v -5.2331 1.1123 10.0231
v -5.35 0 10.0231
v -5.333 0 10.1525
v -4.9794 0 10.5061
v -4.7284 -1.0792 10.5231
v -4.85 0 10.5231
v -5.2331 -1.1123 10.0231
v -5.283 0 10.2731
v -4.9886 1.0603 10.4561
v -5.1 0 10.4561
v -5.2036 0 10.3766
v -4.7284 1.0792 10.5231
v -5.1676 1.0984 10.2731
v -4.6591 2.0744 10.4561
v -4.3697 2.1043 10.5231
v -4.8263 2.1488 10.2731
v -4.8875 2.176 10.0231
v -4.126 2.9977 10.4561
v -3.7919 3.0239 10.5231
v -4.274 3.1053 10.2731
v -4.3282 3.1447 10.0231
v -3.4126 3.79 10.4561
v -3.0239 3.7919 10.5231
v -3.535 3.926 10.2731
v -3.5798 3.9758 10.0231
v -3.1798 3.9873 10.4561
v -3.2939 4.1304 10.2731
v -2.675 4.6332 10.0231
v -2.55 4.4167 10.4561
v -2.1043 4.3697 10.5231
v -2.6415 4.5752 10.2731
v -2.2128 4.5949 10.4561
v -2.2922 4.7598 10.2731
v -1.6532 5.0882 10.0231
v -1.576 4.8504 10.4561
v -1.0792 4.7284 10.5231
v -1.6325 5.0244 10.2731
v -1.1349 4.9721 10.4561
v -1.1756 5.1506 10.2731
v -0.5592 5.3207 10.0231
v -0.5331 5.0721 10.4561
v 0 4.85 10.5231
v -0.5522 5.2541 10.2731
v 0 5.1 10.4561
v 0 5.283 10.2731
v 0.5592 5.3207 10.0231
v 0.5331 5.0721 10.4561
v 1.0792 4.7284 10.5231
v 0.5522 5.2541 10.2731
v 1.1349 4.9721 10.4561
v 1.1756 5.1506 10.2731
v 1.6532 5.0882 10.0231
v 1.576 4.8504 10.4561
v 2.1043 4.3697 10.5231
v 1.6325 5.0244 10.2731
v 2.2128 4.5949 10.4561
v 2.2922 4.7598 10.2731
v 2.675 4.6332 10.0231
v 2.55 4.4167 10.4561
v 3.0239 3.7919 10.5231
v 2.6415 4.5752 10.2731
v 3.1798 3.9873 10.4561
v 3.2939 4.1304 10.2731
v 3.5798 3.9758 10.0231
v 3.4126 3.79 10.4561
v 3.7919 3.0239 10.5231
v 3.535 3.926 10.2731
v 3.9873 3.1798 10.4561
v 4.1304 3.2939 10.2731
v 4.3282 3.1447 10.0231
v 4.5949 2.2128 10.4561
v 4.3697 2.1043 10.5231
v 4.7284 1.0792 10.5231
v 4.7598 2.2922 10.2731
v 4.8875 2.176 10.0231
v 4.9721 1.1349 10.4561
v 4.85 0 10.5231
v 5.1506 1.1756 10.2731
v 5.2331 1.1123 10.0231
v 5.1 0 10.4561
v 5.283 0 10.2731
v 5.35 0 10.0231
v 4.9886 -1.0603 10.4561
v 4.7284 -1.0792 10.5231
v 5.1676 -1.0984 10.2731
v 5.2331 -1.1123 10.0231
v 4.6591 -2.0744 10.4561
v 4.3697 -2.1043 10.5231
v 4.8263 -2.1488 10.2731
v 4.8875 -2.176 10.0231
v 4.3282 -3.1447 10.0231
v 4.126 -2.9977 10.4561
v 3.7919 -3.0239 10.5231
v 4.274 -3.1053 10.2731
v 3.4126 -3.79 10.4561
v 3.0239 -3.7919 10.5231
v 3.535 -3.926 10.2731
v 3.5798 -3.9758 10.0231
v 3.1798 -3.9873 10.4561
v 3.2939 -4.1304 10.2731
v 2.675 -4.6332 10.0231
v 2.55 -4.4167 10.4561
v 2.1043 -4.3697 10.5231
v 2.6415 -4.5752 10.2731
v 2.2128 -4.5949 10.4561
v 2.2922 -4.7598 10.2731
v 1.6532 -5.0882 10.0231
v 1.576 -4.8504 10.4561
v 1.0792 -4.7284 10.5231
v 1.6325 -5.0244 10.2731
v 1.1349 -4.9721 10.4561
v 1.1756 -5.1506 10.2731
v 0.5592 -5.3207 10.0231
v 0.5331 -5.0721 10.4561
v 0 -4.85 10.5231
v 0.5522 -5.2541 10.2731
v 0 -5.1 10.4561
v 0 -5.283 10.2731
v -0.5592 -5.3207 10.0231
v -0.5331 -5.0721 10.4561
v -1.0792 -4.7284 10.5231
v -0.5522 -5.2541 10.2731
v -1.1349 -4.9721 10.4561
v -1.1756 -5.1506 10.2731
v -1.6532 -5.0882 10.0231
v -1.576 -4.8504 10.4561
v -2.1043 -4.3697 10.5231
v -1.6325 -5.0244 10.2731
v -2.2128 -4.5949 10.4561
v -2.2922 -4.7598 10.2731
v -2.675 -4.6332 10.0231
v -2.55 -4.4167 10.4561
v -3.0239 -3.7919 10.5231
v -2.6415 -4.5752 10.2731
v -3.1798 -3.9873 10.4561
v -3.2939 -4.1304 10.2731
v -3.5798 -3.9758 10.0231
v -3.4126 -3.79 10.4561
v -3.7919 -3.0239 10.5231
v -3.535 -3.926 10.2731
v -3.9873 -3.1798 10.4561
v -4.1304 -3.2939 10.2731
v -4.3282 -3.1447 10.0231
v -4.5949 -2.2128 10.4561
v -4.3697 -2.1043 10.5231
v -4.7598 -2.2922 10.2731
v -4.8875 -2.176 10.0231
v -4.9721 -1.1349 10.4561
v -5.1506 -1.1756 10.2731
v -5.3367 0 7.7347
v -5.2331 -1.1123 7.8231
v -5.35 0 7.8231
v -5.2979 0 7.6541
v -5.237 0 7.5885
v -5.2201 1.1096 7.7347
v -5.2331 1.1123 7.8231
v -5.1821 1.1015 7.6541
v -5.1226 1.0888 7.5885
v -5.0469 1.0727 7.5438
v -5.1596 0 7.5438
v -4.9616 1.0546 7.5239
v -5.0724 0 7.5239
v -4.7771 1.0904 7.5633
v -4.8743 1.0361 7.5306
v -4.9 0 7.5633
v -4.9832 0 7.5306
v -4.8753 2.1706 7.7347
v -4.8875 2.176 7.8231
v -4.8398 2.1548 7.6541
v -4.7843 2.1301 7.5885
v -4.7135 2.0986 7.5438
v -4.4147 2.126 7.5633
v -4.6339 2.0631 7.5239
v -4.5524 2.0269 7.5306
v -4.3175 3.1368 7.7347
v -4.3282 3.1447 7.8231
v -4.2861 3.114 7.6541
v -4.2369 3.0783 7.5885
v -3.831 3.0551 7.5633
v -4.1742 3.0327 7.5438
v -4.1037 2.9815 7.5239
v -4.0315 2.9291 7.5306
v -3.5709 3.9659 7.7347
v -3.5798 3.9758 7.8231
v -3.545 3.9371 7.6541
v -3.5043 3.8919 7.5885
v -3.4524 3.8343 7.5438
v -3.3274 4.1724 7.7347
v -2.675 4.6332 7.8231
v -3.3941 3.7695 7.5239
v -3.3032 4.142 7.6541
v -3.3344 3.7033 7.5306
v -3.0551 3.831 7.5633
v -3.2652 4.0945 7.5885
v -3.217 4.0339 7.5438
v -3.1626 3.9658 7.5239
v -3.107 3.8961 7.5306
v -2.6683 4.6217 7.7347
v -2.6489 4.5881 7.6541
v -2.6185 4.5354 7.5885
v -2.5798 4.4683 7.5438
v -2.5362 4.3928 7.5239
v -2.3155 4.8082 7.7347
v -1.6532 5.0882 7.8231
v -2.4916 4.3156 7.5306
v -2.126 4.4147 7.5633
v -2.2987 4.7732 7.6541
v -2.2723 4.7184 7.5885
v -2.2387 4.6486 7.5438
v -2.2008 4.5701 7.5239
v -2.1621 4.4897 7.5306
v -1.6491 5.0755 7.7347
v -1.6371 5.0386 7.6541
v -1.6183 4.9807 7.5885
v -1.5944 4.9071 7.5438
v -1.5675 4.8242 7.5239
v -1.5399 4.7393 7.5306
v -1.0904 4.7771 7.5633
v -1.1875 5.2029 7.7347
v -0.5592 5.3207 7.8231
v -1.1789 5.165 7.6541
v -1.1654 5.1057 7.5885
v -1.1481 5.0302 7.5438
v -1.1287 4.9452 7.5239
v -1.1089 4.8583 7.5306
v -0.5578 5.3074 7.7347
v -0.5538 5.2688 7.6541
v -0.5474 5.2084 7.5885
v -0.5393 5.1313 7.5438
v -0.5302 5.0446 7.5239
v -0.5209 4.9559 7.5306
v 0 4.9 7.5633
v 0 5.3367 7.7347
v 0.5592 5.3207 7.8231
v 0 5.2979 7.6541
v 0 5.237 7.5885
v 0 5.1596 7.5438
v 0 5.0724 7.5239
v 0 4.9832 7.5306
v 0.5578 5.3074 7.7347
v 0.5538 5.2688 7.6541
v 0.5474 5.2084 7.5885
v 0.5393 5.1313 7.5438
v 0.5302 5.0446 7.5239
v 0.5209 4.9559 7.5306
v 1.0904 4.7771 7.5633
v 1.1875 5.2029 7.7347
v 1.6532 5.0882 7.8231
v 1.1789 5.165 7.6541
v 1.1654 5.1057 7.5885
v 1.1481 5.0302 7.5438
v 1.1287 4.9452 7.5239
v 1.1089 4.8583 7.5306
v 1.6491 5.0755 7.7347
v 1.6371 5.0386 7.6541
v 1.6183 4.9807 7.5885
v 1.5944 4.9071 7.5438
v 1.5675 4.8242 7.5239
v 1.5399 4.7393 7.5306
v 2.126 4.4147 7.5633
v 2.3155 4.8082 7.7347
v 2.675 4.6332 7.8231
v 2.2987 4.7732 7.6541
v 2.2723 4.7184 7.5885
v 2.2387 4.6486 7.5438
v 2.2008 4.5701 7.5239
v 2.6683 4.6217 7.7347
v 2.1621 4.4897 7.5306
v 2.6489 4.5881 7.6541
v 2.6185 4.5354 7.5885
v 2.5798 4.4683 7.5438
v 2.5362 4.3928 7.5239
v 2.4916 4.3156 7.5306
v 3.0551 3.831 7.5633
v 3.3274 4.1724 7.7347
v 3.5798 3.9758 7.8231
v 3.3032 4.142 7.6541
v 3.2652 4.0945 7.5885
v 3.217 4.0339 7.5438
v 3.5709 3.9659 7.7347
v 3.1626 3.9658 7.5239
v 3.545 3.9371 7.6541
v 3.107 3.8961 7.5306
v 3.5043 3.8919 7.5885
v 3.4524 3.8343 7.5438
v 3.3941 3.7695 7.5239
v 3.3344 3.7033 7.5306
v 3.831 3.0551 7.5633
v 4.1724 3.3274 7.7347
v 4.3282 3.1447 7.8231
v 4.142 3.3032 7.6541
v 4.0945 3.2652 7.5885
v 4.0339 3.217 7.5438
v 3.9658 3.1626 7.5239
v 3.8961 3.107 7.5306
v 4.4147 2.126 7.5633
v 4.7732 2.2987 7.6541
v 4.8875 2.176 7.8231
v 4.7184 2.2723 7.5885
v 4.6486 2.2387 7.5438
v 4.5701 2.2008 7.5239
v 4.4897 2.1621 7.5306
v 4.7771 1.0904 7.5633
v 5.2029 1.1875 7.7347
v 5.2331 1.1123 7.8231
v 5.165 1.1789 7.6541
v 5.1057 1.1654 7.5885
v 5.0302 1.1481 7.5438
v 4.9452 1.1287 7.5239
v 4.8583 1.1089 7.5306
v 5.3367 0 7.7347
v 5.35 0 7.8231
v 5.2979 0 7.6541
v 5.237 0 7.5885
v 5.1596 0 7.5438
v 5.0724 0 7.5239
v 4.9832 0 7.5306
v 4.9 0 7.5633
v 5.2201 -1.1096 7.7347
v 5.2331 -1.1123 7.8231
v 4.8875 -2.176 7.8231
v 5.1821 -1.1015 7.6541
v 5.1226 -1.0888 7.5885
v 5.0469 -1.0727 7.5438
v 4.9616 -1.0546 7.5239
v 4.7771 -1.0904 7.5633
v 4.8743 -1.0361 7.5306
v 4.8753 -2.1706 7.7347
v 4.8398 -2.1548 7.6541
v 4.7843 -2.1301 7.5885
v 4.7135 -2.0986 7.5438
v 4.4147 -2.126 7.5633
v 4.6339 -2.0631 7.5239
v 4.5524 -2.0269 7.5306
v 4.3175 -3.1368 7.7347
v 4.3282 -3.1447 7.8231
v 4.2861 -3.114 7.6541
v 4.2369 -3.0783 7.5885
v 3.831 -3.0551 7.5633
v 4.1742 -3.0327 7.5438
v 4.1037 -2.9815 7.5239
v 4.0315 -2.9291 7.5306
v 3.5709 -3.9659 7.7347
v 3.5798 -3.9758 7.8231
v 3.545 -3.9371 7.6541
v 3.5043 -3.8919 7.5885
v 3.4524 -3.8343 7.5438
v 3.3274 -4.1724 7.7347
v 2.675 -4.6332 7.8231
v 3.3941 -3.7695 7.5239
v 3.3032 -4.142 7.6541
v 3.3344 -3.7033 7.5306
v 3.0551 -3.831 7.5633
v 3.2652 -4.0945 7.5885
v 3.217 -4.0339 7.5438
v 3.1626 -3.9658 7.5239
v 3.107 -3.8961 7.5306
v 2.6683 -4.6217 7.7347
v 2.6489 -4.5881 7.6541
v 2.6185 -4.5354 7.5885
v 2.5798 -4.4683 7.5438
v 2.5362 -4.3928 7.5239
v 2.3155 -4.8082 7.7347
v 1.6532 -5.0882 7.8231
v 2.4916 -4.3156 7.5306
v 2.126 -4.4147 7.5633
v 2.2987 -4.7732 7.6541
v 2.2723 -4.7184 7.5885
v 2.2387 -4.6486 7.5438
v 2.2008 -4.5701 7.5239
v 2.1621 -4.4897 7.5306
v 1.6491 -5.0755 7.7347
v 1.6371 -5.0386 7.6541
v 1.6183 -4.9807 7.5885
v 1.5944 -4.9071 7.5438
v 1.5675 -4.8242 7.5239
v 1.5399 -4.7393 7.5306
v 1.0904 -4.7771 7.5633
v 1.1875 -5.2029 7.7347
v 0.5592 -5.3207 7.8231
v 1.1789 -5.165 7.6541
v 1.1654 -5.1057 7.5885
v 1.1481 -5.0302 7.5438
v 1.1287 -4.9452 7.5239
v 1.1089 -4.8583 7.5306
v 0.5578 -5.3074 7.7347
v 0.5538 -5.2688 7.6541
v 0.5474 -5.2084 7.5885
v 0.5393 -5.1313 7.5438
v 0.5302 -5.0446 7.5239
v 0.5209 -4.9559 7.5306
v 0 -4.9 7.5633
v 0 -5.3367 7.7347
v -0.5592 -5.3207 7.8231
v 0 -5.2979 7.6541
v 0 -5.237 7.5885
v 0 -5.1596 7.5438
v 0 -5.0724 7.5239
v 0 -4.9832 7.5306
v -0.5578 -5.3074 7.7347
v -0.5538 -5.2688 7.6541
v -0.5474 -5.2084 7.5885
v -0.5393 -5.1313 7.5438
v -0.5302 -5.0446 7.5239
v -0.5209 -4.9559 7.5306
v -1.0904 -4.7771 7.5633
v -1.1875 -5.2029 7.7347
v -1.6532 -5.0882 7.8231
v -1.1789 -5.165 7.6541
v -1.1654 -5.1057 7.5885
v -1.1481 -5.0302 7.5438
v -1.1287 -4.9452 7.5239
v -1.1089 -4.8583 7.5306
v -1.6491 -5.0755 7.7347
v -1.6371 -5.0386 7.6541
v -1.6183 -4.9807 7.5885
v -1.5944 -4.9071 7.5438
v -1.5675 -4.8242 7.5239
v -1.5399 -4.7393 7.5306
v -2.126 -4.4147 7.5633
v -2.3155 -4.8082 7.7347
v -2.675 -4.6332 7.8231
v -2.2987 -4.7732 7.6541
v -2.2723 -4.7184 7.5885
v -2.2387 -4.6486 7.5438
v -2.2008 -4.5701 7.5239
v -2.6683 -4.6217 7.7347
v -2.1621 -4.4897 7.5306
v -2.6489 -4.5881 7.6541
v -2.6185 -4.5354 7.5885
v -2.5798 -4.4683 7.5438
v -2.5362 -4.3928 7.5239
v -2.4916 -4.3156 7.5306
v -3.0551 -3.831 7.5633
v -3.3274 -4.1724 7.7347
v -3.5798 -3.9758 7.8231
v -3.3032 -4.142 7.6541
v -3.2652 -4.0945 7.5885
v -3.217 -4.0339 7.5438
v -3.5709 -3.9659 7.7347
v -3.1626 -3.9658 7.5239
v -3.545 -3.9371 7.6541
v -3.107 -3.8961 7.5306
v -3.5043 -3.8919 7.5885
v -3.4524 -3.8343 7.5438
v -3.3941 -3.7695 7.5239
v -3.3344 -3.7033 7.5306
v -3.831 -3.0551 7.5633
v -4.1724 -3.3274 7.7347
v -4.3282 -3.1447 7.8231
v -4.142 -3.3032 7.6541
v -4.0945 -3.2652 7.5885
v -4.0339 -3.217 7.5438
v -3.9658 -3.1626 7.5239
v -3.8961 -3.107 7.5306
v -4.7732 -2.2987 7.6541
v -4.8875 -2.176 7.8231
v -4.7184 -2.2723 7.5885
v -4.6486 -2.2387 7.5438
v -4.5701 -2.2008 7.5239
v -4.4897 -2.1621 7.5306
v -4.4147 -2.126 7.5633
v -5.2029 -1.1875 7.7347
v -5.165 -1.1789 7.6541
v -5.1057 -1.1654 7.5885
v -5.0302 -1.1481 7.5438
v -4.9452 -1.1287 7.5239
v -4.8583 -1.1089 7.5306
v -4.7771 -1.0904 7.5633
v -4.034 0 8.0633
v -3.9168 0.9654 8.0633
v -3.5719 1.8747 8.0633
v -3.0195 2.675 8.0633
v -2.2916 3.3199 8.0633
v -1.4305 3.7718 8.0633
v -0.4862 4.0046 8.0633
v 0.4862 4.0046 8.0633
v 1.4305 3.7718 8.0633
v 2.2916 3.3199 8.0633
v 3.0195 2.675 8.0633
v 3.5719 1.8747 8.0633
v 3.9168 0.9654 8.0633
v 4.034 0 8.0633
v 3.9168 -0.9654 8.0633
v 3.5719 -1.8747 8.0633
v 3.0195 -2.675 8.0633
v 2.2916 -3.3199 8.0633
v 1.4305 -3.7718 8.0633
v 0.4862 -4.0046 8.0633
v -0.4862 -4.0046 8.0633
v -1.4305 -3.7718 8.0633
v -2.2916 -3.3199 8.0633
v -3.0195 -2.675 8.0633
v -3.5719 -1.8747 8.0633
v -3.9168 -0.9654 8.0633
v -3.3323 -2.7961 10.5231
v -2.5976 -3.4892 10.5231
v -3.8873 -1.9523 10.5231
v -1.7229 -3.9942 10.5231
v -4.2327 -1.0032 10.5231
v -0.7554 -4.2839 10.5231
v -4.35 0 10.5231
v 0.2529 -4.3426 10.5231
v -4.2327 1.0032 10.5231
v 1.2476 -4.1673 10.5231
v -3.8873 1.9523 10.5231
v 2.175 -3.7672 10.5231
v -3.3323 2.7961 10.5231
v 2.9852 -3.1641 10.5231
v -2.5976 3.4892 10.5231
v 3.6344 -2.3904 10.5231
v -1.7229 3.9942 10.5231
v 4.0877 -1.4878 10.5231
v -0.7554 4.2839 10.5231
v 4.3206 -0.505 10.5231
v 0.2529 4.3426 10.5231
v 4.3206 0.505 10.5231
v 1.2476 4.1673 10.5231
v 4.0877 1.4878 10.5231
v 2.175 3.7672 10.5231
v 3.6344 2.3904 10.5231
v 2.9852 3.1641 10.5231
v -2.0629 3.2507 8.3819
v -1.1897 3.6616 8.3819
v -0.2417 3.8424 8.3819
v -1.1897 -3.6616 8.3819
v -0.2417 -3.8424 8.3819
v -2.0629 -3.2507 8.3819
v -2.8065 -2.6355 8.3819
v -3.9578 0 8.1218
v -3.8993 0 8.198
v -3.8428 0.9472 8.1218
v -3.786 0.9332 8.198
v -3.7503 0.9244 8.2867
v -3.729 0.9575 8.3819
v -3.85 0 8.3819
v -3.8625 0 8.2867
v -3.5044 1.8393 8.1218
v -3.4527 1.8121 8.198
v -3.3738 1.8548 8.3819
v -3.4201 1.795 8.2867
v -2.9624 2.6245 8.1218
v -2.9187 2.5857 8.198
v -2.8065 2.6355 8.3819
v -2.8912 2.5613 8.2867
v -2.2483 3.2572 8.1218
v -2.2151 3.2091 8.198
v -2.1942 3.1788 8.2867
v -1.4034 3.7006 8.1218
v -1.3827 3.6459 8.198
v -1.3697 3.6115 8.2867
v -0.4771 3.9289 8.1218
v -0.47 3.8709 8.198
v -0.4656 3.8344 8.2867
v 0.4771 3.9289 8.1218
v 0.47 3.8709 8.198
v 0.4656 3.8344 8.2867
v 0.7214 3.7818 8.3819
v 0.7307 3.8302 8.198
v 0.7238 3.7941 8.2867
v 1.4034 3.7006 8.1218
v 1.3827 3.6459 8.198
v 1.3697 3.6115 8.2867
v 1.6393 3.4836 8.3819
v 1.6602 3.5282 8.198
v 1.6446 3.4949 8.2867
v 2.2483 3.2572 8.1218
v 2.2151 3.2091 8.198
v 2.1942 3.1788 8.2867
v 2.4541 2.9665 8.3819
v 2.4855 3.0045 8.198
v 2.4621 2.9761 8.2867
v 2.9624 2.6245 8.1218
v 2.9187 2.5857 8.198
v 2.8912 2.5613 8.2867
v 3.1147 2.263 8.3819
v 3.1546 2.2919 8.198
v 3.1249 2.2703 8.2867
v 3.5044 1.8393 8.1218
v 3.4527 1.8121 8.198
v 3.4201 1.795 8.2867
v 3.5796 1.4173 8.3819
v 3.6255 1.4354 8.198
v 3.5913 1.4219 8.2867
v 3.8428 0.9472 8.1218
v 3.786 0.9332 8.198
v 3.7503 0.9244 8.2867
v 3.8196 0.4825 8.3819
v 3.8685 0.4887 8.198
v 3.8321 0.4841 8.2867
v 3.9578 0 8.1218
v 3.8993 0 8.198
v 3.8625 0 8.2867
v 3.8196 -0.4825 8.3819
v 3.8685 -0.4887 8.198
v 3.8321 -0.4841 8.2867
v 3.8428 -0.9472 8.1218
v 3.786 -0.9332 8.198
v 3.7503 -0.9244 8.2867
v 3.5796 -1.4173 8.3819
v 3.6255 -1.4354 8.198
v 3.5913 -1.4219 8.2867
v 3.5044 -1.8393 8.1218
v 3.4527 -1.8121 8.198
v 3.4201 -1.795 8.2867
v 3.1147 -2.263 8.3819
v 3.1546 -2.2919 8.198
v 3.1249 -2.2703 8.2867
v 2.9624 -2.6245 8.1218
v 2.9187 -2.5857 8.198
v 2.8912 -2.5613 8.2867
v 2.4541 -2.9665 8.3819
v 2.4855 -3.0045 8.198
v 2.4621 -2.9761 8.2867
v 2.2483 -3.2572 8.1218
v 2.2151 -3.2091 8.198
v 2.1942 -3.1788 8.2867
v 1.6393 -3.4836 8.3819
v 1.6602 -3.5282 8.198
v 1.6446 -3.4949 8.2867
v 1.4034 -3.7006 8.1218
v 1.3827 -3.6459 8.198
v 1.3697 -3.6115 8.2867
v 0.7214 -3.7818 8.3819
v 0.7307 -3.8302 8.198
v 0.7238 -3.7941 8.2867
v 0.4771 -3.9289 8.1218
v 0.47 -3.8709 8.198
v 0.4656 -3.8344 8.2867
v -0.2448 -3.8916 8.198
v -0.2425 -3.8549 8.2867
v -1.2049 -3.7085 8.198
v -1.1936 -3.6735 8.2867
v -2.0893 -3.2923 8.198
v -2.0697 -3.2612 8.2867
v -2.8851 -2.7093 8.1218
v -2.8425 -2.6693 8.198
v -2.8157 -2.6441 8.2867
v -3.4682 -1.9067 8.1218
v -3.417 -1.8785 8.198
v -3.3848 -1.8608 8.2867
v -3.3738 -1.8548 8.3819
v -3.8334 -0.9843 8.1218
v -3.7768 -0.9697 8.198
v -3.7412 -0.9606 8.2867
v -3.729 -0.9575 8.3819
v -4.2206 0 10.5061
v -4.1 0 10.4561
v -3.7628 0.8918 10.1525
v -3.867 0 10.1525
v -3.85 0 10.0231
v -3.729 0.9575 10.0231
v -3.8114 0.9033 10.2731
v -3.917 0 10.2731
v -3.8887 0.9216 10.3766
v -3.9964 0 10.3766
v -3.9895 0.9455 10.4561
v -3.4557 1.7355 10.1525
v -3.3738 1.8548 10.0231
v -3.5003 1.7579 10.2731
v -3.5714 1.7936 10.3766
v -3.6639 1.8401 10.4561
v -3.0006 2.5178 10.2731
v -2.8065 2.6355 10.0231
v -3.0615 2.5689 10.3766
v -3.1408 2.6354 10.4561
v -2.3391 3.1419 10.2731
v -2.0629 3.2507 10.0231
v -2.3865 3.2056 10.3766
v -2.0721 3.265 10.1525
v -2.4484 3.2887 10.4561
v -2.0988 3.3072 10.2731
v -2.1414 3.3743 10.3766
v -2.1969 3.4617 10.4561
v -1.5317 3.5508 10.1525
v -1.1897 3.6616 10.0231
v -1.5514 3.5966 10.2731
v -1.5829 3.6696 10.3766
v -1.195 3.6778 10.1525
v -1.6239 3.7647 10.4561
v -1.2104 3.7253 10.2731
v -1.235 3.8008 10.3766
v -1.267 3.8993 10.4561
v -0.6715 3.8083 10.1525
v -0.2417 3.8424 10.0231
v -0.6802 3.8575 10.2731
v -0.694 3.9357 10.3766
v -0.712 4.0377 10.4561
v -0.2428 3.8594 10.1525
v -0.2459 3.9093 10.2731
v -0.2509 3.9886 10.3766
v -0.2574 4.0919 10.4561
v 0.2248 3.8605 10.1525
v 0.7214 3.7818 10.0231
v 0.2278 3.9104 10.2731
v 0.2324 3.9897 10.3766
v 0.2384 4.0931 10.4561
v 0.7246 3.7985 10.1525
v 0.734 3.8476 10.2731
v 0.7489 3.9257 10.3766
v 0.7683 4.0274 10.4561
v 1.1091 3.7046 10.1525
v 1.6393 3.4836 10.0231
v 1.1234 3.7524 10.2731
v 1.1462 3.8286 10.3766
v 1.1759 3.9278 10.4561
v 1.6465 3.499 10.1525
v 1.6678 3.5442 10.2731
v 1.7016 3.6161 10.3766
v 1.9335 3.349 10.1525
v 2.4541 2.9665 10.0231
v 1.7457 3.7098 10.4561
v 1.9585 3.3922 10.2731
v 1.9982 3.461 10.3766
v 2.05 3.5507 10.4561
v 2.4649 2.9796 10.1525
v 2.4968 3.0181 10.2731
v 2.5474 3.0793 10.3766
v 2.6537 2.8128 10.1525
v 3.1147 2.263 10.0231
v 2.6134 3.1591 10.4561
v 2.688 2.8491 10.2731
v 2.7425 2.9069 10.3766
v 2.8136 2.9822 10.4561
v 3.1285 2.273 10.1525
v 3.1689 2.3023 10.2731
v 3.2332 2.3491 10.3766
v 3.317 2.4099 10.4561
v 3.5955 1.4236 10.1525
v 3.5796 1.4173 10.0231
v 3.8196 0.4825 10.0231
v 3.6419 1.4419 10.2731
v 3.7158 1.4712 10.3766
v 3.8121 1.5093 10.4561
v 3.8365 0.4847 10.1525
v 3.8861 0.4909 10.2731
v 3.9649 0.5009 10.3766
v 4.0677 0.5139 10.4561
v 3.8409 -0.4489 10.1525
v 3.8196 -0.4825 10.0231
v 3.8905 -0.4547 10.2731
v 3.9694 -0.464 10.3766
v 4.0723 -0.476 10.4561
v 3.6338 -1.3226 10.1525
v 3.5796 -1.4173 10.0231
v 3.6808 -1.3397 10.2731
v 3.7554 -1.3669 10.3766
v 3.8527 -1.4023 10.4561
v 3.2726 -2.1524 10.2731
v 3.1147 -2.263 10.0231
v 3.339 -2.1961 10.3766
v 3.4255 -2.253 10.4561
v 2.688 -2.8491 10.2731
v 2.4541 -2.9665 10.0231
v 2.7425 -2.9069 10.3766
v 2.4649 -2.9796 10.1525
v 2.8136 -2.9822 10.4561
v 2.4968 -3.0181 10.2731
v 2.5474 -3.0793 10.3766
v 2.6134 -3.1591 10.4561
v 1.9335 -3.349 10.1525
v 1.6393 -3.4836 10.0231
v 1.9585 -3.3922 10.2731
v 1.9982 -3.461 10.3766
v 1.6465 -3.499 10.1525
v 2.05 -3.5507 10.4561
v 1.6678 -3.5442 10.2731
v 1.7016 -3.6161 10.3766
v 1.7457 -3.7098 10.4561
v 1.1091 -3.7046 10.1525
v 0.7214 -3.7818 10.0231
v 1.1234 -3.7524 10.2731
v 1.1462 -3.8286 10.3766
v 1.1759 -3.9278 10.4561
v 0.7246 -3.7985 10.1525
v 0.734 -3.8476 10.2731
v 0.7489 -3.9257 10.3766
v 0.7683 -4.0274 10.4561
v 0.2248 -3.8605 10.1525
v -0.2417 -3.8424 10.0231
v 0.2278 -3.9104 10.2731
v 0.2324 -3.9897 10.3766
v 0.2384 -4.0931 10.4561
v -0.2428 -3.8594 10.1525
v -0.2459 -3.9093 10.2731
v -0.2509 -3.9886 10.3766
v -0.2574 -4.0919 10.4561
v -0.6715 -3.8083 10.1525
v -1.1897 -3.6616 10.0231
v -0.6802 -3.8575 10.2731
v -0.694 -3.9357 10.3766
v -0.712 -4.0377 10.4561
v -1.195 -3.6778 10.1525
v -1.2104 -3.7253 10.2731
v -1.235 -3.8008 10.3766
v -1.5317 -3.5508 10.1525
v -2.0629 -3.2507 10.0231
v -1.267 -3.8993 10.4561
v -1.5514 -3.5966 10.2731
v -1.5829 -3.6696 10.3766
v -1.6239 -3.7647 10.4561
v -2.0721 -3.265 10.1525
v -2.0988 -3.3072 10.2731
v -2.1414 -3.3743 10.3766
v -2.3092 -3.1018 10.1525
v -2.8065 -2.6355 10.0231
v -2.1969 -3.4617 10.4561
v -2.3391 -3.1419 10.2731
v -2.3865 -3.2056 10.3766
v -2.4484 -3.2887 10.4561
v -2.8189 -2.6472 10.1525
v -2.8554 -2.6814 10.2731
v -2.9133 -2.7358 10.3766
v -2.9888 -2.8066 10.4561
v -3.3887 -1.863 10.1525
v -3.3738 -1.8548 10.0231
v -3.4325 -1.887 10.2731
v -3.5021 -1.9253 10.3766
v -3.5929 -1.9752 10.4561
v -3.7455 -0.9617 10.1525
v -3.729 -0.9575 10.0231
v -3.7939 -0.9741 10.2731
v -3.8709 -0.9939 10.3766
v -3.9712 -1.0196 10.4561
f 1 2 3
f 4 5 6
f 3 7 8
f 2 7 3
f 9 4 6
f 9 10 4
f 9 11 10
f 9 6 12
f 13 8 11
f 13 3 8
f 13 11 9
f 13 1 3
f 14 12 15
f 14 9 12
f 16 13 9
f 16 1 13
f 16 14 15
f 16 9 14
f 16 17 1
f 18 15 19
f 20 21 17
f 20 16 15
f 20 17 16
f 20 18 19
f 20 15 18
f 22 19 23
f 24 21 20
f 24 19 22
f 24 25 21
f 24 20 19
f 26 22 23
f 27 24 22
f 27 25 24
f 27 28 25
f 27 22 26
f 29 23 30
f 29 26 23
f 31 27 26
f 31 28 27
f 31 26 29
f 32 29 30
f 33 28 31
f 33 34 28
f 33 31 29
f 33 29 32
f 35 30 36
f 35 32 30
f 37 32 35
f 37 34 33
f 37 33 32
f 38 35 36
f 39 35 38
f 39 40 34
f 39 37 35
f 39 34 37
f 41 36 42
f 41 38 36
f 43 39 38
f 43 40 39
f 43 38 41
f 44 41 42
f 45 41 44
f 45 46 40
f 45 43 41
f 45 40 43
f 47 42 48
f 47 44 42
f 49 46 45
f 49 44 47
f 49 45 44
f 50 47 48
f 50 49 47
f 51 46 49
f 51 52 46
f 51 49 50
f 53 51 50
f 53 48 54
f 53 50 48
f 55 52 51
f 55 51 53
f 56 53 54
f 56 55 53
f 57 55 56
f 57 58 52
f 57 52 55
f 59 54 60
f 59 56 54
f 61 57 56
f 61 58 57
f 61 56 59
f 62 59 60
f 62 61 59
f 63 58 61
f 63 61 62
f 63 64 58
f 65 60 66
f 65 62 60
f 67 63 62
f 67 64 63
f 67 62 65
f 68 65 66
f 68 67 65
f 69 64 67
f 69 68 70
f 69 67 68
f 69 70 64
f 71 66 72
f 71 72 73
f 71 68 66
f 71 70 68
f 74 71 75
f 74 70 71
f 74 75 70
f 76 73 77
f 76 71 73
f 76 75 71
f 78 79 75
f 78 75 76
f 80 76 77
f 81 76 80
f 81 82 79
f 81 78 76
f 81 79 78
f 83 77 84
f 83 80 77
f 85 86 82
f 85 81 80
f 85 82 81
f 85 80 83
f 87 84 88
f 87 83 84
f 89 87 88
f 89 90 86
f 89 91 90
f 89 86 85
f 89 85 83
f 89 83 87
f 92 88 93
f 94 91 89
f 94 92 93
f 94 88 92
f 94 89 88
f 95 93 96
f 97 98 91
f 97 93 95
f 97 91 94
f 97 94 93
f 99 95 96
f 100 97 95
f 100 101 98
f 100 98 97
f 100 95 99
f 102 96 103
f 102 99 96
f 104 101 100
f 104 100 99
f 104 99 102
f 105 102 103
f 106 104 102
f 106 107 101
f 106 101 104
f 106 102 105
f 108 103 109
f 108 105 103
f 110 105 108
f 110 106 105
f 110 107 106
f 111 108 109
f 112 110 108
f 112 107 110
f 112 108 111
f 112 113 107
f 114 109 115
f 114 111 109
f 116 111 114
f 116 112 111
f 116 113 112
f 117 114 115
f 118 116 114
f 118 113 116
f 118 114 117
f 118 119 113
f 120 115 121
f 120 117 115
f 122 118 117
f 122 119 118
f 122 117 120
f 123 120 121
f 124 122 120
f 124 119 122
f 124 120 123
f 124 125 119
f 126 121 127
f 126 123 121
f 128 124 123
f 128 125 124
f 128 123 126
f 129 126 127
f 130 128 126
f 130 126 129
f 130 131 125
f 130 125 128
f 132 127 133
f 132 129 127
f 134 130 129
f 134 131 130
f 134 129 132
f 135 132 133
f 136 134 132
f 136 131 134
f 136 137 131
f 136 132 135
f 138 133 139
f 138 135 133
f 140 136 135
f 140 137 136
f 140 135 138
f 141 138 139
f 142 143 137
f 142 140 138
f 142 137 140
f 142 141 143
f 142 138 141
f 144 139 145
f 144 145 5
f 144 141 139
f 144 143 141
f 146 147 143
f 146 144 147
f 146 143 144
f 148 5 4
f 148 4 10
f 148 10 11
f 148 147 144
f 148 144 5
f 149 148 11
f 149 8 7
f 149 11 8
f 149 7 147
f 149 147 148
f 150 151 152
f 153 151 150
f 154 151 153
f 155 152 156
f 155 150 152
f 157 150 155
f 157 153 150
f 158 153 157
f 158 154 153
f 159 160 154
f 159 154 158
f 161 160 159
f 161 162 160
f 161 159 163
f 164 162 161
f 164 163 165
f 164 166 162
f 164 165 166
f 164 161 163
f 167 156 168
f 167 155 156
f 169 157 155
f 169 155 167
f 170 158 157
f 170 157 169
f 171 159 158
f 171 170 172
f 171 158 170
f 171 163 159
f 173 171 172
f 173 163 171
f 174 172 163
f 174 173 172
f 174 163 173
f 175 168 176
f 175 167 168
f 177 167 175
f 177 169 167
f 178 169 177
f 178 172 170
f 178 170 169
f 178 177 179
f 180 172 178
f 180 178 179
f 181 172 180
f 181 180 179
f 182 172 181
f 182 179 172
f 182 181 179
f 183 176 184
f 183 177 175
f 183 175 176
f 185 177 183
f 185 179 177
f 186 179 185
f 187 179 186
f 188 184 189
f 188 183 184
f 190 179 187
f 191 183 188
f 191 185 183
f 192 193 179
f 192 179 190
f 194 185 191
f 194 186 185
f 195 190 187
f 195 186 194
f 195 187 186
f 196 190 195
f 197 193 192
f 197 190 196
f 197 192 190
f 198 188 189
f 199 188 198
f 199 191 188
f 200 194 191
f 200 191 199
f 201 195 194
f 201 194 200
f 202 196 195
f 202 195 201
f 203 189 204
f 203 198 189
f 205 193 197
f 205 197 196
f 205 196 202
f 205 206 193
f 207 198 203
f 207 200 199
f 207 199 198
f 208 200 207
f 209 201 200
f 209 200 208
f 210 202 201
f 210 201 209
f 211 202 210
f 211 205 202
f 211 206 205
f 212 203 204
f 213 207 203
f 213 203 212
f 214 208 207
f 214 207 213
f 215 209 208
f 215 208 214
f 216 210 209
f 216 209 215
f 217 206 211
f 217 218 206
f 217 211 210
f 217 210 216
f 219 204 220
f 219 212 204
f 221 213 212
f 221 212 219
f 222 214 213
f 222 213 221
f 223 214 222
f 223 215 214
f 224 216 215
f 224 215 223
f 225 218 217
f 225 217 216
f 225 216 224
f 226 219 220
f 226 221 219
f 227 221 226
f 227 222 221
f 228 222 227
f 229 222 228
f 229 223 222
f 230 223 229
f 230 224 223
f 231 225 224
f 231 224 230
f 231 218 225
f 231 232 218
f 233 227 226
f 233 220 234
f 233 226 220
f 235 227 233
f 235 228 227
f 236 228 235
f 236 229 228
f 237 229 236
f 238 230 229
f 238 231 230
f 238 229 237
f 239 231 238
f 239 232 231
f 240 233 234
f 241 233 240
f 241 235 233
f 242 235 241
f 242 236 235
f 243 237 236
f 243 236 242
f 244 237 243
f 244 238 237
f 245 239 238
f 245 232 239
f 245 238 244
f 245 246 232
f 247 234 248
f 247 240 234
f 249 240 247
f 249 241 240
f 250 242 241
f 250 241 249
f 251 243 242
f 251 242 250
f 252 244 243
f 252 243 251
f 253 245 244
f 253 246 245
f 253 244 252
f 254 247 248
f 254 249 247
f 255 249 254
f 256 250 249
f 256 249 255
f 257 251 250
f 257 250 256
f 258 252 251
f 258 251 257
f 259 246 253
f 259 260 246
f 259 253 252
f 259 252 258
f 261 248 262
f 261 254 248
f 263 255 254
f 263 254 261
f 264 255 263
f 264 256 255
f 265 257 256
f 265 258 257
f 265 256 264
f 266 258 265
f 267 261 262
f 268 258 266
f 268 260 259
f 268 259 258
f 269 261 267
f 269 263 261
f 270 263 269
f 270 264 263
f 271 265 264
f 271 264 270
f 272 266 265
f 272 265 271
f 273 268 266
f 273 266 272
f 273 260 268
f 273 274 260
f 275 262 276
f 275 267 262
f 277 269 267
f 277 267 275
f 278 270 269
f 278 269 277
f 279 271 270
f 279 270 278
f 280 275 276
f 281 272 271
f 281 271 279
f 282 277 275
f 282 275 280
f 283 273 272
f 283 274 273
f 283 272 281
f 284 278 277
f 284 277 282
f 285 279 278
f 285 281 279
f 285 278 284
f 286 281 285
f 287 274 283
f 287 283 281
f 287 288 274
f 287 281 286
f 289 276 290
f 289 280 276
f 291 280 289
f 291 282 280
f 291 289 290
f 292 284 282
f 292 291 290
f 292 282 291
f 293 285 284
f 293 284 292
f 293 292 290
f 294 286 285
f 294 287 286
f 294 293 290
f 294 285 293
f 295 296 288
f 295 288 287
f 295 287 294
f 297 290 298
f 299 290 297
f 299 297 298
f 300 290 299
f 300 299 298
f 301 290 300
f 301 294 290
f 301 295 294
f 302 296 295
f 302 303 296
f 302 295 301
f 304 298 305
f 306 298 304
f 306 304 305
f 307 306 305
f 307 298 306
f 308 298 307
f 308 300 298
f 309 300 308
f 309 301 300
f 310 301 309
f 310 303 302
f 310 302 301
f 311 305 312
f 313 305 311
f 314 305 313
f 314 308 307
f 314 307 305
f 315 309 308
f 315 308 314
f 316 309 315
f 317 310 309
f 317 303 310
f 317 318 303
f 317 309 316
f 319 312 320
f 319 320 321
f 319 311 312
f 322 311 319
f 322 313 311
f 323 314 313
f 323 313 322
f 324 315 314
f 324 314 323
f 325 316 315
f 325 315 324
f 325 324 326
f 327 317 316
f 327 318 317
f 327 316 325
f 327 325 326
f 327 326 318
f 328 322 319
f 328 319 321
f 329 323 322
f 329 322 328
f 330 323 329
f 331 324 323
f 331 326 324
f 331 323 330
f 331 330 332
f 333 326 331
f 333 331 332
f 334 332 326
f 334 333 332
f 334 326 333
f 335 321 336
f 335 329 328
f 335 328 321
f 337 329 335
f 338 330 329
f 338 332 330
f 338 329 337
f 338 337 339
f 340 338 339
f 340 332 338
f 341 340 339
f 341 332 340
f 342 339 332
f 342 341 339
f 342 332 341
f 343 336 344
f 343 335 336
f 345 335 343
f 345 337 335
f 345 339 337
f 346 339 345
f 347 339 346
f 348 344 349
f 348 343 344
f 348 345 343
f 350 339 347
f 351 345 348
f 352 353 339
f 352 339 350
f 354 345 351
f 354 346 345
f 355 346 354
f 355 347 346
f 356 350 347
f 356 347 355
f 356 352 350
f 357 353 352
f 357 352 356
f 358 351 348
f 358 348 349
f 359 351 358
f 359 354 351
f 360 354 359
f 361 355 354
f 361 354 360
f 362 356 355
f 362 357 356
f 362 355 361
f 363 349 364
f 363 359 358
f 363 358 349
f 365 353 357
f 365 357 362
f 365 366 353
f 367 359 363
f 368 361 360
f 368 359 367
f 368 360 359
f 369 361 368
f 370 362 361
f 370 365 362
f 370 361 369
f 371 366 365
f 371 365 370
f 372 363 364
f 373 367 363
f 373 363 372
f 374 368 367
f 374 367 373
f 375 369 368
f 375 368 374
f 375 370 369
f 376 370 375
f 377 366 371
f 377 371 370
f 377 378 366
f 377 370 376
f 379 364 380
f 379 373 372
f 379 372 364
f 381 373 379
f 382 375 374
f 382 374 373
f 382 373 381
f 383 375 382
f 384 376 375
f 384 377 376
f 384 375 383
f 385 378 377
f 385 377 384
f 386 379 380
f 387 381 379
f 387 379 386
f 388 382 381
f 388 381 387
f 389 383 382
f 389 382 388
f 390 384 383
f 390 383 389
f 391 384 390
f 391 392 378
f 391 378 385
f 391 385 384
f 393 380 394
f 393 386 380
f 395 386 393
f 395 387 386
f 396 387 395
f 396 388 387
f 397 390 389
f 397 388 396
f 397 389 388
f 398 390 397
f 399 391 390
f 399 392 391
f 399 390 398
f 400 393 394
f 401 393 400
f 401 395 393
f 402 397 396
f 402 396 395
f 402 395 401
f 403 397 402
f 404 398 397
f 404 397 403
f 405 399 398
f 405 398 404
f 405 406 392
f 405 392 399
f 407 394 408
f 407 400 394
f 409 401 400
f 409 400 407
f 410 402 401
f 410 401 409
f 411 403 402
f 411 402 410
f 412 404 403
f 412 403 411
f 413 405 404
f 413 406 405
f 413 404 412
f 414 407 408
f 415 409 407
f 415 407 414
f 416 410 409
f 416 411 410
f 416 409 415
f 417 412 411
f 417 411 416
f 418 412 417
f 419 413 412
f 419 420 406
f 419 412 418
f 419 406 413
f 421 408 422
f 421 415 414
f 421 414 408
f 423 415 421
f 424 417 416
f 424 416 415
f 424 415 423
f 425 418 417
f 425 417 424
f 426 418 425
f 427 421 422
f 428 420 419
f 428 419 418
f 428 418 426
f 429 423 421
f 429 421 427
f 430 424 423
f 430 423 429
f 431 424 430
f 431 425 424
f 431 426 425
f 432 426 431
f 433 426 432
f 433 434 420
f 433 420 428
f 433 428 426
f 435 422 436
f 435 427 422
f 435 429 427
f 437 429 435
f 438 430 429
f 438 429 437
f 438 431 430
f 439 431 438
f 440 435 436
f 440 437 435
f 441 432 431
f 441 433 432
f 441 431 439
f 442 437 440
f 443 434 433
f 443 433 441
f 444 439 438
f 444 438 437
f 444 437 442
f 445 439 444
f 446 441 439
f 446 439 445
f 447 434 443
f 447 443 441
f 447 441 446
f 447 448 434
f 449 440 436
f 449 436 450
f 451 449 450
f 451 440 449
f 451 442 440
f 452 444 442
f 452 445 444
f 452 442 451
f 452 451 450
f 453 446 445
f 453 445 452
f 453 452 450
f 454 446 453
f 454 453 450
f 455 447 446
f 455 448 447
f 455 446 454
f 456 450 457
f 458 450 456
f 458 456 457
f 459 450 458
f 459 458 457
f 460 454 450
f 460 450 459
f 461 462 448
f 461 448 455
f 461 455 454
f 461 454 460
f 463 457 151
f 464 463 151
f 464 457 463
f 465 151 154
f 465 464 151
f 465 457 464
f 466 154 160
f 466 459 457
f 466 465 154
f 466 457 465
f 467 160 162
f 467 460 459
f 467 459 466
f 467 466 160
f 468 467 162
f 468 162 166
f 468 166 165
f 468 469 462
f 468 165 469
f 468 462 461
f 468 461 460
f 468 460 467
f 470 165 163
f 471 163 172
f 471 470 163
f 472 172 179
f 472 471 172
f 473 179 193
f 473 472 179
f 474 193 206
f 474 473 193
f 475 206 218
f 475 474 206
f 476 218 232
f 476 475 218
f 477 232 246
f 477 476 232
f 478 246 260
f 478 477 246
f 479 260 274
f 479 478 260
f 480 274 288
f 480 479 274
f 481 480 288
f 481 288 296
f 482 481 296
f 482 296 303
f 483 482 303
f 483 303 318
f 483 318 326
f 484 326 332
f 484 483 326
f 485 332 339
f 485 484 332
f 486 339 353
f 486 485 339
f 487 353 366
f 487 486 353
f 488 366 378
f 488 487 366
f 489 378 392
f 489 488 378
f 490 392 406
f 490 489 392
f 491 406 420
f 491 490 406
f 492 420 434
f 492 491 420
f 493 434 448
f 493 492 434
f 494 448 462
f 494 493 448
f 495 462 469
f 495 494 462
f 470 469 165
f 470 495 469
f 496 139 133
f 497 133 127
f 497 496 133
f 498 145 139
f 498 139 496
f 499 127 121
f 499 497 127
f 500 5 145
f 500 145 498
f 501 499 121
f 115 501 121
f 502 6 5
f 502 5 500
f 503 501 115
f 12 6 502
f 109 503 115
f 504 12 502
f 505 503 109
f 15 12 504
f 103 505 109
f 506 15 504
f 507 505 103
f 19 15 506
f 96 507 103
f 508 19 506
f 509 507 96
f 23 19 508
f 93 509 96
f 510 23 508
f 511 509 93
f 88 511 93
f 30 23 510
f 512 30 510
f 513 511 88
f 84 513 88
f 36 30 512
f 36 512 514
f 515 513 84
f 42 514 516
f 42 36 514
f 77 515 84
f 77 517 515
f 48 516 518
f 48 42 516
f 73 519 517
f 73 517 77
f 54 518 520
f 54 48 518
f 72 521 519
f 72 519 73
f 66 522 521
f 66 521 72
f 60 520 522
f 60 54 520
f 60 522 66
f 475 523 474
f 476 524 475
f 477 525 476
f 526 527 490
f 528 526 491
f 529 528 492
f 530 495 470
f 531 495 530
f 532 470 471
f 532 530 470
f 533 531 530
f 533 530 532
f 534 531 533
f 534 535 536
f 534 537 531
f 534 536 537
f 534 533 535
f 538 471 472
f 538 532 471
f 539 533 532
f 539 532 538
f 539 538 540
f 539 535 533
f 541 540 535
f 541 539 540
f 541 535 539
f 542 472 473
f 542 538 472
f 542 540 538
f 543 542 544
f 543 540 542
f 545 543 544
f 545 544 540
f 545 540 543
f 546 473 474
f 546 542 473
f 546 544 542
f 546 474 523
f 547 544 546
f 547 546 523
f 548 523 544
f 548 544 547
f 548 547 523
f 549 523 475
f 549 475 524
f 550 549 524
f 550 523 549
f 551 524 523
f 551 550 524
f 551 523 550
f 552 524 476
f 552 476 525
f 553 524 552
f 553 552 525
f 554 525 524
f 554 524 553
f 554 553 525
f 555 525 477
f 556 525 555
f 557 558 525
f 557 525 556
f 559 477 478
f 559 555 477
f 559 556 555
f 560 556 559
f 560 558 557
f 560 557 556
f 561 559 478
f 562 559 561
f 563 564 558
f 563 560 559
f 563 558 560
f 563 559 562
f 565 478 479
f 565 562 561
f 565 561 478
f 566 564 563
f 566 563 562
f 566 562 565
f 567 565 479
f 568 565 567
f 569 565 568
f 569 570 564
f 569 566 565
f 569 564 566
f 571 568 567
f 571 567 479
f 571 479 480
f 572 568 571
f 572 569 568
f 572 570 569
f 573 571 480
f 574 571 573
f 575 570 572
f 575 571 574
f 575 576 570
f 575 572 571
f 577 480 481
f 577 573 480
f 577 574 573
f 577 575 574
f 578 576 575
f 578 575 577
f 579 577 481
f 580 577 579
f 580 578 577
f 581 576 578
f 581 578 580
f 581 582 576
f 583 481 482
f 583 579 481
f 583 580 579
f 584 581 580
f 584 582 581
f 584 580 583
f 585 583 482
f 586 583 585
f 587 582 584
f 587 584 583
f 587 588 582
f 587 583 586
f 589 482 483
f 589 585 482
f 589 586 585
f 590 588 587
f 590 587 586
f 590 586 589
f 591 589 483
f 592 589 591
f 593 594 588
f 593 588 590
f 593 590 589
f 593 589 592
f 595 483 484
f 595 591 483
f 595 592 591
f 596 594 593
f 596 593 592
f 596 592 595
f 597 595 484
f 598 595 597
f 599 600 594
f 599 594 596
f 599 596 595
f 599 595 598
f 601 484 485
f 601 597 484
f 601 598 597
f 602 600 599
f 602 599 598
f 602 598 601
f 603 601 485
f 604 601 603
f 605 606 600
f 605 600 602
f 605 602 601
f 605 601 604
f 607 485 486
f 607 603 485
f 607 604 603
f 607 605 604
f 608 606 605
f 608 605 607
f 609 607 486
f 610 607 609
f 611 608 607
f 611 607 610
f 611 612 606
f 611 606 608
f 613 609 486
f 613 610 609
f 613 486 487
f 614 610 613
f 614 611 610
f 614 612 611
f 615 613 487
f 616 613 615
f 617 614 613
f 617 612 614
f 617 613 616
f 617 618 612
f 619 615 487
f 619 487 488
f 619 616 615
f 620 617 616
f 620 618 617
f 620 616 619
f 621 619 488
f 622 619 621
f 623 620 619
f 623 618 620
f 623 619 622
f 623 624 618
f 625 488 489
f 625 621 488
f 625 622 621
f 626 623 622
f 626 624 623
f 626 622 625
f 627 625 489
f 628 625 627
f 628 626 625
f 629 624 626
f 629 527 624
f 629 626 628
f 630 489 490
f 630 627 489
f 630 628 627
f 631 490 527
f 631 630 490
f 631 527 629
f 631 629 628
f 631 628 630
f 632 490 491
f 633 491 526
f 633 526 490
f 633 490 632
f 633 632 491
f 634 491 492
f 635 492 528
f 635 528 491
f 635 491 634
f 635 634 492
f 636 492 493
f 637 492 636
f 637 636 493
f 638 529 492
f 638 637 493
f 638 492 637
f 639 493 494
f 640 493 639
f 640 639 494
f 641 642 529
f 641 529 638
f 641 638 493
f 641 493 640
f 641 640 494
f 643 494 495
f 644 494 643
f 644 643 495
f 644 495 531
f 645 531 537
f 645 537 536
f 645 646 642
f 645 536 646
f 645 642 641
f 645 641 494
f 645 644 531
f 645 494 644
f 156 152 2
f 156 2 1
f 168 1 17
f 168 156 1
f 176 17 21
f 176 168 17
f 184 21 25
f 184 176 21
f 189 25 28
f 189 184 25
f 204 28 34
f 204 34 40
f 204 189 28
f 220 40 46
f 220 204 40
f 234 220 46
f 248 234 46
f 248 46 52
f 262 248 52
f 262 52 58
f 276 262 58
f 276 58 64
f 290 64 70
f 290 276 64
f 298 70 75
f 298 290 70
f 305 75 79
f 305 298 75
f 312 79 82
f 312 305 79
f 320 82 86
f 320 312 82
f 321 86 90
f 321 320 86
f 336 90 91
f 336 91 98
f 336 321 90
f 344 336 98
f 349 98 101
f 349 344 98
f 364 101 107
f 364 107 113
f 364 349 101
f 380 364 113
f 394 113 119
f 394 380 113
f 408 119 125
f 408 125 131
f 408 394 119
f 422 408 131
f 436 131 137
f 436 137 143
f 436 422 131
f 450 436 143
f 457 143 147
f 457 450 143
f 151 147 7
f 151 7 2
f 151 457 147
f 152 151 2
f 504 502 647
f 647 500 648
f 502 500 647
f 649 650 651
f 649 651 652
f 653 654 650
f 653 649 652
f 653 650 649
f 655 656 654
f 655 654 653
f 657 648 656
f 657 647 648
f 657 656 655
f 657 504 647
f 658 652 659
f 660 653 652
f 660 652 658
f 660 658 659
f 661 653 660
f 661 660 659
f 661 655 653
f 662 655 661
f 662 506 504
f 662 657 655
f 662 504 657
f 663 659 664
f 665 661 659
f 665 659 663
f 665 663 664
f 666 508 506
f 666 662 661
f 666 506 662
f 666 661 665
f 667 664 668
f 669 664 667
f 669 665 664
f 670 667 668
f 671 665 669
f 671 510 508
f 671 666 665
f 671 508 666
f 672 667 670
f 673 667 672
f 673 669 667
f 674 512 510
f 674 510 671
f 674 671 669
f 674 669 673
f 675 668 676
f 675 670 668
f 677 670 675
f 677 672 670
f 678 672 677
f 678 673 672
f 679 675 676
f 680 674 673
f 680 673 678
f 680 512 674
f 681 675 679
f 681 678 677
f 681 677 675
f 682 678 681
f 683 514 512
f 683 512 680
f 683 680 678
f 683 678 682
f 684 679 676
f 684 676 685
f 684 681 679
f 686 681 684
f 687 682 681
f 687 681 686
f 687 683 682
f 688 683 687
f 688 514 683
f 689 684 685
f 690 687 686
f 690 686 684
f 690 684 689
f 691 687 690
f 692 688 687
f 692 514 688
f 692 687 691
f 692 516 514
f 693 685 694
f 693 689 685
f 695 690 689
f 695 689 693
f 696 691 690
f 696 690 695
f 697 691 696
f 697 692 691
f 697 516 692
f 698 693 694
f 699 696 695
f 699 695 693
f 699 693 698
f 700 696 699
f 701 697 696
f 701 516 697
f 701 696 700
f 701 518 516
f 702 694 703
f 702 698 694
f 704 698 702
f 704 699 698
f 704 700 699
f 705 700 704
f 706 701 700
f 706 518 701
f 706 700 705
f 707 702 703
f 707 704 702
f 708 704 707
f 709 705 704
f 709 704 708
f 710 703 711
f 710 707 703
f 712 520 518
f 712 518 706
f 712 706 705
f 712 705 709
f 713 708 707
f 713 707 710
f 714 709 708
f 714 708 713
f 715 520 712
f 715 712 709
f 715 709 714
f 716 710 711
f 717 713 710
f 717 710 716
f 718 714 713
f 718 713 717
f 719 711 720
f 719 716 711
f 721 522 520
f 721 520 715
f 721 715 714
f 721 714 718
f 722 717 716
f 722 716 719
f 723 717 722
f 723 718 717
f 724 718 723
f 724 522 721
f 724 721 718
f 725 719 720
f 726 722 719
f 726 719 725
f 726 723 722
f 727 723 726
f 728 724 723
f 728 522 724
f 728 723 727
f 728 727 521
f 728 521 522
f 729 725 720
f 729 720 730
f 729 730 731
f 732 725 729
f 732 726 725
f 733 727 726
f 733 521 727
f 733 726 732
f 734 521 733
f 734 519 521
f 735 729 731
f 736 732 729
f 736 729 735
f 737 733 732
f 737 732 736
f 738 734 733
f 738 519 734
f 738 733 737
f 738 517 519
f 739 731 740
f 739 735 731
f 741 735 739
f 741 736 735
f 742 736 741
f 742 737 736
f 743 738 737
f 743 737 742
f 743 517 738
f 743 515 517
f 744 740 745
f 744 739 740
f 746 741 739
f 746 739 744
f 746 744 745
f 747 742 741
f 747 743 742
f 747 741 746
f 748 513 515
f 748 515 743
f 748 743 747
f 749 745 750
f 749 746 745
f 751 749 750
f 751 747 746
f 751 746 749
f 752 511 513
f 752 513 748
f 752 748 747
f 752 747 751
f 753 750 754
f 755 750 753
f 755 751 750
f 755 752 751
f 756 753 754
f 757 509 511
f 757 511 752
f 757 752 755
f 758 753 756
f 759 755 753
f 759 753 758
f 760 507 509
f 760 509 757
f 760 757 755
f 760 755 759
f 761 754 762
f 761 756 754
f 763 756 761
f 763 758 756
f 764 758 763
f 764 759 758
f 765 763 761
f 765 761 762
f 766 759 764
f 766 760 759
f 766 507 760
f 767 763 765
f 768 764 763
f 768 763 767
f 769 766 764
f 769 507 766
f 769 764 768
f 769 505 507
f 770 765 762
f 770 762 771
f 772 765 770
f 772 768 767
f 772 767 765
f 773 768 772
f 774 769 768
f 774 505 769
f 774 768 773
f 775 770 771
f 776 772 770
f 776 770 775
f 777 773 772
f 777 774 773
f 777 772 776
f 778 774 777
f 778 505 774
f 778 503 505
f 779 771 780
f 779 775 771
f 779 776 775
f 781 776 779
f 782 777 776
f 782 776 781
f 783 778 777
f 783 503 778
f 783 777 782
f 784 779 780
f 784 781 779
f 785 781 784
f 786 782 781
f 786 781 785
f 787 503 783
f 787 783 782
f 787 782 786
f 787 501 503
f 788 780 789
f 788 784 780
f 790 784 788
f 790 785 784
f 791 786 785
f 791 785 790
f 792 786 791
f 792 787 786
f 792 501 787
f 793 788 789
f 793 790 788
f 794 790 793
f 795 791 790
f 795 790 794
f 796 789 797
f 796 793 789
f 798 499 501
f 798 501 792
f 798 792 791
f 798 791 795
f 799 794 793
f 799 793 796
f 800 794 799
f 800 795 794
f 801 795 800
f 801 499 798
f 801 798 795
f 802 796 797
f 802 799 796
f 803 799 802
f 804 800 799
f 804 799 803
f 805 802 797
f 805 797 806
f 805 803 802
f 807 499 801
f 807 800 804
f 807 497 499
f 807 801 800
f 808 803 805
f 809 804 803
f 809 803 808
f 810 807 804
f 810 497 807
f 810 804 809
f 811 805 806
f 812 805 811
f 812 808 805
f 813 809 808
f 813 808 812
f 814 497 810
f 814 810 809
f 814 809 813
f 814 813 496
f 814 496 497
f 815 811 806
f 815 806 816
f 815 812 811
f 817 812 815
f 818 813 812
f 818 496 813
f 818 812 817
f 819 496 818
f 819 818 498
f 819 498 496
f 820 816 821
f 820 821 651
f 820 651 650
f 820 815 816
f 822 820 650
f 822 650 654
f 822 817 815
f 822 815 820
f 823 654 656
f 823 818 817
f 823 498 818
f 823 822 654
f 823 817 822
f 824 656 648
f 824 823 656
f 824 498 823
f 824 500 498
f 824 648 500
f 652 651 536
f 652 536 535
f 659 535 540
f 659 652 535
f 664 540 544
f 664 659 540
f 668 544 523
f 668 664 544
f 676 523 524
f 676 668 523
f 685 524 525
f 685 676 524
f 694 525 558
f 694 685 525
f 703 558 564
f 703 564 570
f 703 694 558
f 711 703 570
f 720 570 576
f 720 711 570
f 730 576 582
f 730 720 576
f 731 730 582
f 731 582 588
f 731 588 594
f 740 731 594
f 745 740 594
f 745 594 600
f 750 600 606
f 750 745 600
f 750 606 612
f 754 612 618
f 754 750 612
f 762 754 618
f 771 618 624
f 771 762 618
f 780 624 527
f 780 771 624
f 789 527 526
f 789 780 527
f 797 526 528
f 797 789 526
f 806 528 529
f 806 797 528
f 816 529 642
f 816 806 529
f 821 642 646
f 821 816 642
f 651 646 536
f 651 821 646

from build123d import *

# Parameters (mm, degrees)
F2_R = 0.5


with BuildPart() as f1:
    # F0 (on Front) → F1 (revolve)
    with BuildSketch(Plane.XZ):
        with BuildLine():
            Line((-4.9, 7.563289), (-4.033975, 8.063289))
            ThreePointArc((-4.033975, 8.063289), (-3.899296, 8.197967), (-3.85, 8.381942))
            Line((-3.85, 8.381942), (-3.85, 10.523096))
            Line((-3.85, 10.523096), (-5.35, 10.523096))
            Line((-5.35, 10.523096), (-5.35, 7.823096))
            ThreePointArc((-5.35, 7.823096), (-5.2, 7.563289), (-4.9, 7.563289))
        make_face()
    revolve(axis=Axis((0, 0, -0.587365), (0, 0, -1)))

    # F2
    f2_edges = [f1.edges().sort_by_distance(p)[0] for p in [
        (3.85, 0, 10.523096),
        (5.35, 0, 10.523096),
    ]]
    fillet(f2_edges, radius=F2_R)


solid = f1.part
